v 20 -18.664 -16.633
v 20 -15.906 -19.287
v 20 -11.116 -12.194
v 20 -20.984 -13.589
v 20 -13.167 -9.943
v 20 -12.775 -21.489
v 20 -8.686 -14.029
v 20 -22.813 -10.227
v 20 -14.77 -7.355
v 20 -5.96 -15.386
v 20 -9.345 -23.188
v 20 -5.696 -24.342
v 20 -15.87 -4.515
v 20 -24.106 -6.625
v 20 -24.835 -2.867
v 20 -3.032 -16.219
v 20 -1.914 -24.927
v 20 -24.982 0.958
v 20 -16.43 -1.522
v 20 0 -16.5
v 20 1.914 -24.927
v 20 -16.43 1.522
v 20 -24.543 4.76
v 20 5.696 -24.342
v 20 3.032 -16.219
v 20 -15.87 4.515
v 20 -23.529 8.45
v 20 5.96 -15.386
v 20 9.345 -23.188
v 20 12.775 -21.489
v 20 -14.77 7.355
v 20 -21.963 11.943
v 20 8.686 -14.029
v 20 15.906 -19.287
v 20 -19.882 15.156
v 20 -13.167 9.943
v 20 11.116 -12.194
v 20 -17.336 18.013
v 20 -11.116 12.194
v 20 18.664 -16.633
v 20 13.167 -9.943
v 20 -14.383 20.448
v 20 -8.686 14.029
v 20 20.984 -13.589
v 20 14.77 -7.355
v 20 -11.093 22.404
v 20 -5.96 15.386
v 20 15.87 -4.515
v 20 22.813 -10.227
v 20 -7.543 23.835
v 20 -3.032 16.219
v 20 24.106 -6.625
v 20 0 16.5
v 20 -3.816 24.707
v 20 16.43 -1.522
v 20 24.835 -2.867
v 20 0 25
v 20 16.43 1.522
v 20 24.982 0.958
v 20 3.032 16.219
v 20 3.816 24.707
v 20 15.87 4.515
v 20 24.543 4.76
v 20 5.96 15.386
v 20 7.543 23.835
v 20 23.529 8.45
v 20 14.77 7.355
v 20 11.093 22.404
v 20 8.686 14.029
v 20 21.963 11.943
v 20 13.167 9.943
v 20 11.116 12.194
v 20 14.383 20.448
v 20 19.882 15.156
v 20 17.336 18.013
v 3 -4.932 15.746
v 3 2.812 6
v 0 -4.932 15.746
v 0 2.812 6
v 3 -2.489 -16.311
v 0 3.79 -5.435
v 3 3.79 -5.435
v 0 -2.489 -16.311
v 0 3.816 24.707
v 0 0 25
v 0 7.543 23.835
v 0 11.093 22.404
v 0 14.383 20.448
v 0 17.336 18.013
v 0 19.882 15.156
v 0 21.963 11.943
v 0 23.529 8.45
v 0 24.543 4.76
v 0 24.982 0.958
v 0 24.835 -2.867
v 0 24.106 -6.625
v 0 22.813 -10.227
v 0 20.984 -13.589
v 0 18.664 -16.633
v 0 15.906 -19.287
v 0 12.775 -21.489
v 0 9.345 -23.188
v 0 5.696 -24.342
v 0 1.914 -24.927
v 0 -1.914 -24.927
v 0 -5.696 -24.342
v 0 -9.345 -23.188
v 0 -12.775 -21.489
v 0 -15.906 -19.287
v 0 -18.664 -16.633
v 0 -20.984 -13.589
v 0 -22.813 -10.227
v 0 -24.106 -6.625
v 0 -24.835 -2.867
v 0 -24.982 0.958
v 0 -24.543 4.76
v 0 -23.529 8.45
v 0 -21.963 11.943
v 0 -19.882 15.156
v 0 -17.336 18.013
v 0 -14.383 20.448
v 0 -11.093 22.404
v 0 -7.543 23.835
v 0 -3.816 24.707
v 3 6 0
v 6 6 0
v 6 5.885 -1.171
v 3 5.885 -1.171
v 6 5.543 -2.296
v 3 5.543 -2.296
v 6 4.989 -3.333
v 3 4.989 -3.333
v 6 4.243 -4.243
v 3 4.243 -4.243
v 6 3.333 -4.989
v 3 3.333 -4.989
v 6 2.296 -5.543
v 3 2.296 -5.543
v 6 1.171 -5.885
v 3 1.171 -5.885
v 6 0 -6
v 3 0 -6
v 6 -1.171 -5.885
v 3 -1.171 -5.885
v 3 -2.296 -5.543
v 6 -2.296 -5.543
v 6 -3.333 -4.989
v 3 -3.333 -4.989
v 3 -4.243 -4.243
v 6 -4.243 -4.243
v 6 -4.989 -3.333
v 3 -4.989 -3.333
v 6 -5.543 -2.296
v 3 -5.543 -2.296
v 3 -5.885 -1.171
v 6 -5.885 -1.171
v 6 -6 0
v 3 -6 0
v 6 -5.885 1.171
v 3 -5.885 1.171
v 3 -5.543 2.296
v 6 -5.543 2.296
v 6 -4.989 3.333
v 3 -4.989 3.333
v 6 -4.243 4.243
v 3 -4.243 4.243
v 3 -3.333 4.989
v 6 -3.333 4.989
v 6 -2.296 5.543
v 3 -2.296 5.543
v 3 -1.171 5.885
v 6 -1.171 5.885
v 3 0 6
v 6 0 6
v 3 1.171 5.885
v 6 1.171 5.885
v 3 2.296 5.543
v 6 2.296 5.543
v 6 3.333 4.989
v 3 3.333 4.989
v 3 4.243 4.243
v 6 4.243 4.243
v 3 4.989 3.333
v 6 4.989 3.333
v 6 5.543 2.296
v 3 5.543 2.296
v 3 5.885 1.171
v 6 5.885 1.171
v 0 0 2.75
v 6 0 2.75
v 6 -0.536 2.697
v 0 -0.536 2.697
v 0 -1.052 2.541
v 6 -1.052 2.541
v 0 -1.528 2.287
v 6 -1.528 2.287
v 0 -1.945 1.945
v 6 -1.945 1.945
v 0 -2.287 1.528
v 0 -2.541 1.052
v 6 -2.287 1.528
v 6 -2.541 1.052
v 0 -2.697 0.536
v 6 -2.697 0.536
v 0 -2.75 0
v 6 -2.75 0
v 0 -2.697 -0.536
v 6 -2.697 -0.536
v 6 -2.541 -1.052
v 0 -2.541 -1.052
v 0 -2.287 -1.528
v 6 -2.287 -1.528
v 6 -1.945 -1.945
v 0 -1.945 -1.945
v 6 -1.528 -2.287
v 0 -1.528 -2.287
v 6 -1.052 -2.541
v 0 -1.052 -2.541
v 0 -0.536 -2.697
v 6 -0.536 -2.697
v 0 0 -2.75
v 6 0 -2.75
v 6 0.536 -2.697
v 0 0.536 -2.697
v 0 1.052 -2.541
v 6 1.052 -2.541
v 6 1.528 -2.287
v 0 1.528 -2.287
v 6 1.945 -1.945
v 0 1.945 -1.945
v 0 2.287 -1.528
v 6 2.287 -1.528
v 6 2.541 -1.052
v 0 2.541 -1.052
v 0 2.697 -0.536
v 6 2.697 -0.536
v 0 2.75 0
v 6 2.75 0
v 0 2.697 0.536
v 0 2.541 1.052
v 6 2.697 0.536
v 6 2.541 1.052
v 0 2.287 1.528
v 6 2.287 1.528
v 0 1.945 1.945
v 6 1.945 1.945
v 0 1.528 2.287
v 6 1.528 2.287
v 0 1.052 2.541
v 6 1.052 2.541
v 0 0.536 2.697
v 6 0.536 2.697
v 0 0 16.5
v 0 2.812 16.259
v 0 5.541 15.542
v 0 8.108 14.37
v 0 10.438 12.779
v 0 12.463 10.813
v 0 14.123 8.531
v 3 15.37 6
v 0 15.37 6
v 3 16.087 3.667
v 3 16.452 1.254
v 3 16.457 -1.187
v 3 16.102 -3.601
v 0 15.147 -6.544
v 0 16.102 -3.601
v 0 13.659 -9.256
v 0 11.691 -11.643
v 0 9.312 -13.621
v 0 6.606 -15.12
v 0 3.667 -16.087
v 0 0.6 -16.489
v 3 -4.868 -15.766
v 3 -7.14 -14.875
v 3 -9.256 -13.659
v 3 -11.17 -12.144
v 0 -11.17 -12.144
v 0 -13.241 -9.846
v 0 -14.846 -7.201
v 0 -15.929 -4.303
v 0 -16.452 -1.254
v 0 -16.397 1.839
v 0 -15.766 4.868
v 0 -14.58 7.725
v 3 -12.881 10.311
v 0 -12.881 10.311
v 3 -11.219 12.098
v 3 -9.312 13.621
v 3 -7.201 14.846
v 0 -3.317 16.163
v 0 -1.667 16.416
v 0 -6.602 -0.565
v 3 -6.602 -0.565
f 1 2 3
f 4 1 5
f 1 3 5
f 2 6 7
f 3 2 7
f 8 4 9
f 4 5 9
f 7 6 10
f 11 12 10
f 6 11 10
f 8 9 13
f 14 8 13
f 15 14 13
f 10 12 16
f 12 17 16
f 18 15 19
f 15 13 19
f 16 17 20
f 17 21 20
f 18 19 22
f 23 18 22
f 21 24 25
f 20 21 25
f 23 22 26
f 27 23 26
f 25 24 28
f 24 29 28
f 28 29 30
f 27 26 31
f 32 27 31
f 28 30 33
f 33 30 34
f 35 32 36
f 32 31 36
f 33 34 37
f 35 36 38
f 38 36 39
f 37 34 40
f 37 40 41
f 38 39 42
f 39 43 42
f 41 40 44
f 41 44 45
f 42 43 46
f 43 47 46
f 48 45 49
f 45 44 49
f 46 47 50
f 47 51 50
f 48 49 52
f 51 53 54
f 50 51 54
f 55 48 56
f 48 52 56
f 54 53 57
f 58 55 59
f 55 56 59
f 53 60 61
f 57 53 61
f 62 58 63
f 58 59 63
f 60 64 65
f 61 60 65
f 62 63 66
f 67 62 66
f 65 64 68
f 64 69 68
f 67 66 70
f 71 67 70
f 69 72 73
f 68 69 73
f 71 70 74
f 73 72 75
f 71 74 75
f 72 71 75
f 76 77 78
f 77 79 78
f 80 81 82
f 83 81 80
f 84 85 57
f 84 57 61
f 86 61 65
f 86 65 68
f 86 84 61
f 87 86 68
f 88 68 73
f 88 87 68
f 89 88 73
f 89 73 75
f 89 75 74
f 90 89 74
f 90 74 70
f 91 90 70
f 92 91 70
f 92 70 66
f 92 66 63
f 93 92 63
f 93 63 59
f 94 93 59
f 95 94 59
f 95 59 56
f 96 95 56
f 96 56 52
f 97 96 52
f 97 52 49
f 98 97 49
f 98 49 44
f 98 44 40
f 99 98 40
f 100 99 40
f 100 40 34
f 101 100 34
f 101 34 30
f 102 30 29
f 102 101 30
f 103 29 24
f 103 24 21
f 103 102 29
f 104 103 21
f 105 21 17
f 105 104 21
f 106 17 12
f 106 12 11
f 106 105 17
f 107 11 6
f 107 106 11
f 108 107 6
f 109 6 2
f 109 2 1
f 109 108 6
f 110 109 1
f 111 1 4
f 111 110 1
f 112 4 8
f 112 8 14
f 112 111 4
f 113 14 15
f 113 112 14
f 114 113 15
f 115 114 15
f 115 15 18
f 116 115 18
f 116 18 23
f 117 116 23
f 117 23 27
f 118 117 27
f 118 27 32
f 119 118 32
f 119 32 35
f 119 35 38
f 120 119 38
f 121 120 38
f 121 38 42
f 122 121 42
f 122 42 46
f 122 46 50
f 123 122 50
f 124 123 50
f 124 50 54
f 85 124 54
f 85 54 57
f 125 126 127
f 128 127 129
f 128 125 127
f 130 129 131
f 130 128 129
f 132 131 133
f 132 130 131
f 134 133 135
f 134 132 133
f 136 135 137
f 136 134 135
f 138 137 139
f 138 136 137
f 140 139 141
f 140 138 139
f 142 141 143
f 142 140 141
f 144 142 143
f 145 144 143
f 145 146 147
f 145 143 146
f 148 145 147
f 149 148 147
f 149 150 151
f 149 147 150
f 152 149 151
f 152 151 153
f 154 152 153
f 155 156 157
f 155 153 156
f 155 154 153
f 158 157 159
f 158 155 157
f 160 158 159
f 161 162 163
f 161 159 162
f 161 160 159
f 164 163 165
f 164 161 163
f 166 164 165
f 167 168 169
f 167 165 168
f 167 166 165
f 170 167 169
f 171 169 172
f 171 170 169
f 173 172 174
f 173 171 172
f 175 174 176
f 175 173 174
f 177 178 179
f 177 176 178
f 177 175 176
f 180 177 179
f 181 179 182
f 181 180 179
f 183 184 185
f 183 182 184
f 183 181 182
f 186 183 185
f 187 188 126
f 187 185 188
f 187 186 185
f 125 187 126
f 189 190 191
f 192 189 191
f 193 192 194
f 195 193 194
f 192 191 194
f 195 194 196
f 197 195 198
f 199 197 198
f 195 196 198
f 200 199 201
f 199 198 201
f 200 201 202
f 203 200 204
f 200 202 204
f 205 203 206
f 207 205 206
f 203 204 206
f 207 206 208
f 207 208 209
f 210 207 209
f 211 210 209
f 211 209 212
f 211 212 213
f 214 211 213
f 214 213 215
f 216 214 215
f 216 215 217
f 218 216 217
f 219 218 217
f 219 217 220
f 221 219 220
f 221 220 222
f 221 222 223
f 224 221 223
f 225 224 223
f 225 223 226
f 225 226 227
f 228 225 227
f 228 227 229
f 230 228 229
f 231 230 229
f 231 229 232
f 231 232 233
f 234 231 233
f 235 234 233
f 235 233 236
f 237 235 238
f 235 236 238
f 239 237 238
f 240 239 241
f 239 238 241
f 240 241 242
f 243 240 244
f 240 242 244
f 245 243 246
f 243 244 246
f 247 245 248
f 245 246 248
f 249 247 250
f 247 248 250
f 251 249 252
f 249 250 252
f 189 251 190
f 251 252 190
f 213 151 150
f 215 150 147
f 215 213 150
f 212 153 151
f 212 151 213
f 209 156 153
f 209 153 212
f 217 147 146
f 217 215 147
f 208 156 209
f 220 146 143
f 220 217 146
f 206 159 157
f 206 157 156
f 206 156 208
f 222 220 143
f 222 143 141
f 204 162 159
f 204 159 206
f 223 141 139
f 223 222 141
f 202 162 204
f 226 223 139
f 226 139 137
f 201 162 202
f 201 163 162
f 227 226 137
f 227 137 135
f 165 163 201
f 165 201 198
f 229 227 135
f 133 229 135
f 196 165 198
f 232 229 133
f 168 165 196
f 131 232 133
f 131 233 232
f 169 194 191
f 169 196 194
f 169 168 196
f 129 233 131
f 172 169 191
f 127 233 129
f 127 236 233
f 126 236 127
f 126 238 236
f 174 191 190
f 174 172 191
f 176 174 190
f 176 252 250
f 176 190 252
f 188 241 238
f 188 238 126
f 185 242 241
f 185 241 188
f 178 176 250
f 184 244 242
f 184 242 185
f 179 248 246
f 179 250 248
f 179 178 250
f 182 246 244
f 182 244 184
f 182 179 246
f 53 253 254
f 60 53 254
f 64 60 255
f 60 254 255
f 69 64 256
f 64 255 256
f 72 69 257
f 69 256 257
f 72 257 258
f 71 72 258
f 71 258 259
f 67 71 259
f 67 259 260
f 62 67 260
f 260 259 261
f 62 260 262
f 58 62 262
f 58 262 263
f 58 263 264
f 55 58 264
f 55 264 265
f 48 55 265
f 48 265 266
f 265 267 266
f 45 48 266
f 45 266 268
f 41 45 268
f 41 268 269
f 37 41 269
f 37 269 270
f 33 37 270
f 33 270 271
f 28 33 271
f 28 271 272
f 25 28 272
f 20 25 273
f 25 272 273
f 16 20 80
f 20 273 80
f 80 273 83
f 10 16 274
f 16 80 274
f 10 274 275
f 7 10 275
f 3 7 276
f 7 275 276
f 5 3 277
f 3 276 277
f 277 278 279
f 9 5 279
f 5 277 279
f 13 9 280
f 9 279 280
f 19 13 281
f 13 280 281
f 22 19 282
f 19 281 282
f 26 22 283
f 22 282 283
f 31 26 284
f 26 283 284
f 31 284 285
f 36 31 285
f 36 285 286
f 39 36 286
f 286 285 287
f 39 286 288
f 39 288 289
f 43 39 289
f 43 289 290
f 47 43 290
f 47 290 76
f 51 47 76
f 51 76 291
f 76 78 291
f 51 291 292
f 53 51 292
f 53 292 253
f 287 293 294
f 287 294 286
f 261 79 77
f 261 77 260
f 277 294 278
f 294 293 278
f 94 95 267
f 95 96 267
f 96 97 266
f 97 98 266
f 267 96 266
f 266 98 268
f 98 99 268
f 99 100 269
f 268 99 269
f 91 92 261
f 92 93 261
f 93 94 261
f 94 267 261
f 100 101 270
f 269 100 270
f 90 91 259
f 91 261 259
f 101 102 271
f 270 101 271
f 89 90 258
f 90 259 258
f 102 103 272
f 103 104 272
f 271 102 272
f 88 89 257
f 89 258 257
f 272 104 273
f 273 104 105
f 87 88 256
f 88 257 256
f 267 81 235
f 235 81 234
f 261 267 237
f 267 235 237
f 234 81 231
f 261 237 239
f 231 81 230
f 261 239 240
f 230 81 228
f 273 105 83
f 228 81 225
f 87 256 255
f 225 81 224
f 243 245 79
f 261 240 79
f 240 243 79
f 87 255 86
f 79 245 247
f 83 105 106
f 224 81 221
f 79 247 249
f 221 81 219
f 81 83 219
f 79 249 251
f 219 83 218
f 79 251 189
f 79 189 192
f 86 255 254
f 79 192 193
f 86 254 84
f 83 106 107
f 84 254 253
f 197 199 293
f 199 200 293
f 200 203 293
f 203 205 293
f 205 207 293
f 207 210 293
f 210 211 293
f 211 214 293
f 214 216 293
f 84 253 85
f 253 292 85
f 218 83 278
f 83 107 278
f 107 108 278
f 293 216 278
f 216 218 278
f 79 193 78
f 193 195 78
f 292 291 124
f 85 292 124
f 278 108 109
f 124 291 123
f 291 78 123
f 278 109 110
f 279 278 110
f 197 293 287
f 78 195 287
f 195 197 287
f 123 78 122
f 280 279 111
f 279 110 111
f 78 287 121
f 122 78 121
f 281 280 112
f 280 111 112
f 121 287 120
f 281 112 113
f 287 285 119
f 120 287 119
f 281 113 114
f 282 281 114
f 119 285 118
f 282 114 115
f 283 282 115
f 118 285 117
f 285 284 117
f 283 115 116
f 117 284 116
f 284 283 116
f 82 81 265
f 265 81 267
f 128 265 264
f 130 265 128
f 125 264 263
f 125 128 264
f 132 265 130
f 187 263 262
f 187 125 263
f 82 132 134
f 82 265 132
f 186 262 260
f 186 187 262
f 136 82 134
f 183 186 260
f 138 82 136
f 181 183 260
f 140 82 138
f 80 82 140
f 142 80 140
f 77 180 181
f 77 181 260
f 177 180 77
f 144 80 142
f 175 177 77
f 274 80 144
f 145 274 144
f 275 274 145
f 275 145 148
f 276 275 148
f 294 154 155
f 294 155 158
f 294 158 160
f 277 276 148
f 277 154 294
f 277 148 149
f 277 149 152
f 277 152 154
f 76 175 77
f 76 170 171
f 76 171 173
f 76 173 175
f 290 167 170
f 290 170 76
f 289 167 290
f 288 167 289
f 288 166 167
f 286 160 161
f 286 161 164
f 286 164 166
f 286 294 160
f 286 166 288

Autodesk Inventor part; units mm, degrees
ref_plane "YZ Plane" through (0, 0, 0) normal (1, 0, 0) x (0, 1, 0)
ref_plane "XZ Plane" through (0, 0, 0) normal (0, 1, 0) x (-1, 0, 0)
ref_plane "XY Plane" through (0, 0, 0) normal (0, 0, 1) x (1, 0, 0)
sketch "Sketch1" plane through (0, 0, 0) normal (1, 0, 0) x (0, 1, 0)
  circle A0 centre (0, 0) radius 6
  dimension "hubouter" = 12
extrude "Extrusion1" add sketch "Sketch1" along normal blind 6
sketch "Sketch2" plane through (0, 0, 0) normal (-1, 0, 0) x (0, 0, 1)
  circle A0 centre (0, 0) radius 1.5
  dimension "hole" = 3
hole "Hole1" at (0, 0, 0) direction (1, 0, 0) diameter 5.5 end through all
sketch "Sketch3" plane through (0, 0, 0) normal (-1, 0, 0) x (0, 0, 1)
  circle A0 centre (0, 0) radius 16.5
  circle A1 centre (0, 0) radius 25
  circle A2 centre (0, 0) radius 6 projected
  line L0 (6, 0) -> (26, 0)
  line L1 (16.1025, -3.6) -> (4.8, -3.6)
  line L2 (16.1025, 3.6) -> (4.8, 3.6)
  arc A3 (4.8, -3.6) -> (4.8, 3.6) centre (0, 0) ccw
  dimension "innerdiam" = 33
  dimension "outerdiam" = 50
extrude "Extrusion2" add sketch "Sketch3" against normal blind 20
sketch "Sketch5" plane through (0, 0, 0) normal (1, 0, 0) x (0, 1, 0)
  circle A0 centre (0, 0) radius 6 construction
  line L0 (0, 6) -> (22.3607, 6)
  circle A1 centre (0, 0) radius 2.75 projected
  line L1 (0, -6) -> (23.0083, -2.5724)
  line L2 (23.0083, -2.5724) -> (22.7003, -2.6183)
  arc A2 (0, -6) -> (0, 6) centre (0, 0) ccw
  arc A3 (23.0083, -2.5724) -> (22.3607, 6) centre (0, 0) ccw
  point P0 (1.7489, -5.7395)
extrude "Extrusion4" add sketch "Sketch5" along normal blind 3 contours L0 A3 L1 A2
pattern_circular "Circular Pattern2" count 3 over 360 about axis through (-10, 0, 0) along (1, 0, 0) of "Extrusion4"
ref_plane "Work Plane4" through (3, 16.1022, -3.6012) normal (1, 0, 0) x (0, 1, 0)
properties part number "Reaction_wheel_dr - Copy (3.3)" material "Steel, Carbon"
